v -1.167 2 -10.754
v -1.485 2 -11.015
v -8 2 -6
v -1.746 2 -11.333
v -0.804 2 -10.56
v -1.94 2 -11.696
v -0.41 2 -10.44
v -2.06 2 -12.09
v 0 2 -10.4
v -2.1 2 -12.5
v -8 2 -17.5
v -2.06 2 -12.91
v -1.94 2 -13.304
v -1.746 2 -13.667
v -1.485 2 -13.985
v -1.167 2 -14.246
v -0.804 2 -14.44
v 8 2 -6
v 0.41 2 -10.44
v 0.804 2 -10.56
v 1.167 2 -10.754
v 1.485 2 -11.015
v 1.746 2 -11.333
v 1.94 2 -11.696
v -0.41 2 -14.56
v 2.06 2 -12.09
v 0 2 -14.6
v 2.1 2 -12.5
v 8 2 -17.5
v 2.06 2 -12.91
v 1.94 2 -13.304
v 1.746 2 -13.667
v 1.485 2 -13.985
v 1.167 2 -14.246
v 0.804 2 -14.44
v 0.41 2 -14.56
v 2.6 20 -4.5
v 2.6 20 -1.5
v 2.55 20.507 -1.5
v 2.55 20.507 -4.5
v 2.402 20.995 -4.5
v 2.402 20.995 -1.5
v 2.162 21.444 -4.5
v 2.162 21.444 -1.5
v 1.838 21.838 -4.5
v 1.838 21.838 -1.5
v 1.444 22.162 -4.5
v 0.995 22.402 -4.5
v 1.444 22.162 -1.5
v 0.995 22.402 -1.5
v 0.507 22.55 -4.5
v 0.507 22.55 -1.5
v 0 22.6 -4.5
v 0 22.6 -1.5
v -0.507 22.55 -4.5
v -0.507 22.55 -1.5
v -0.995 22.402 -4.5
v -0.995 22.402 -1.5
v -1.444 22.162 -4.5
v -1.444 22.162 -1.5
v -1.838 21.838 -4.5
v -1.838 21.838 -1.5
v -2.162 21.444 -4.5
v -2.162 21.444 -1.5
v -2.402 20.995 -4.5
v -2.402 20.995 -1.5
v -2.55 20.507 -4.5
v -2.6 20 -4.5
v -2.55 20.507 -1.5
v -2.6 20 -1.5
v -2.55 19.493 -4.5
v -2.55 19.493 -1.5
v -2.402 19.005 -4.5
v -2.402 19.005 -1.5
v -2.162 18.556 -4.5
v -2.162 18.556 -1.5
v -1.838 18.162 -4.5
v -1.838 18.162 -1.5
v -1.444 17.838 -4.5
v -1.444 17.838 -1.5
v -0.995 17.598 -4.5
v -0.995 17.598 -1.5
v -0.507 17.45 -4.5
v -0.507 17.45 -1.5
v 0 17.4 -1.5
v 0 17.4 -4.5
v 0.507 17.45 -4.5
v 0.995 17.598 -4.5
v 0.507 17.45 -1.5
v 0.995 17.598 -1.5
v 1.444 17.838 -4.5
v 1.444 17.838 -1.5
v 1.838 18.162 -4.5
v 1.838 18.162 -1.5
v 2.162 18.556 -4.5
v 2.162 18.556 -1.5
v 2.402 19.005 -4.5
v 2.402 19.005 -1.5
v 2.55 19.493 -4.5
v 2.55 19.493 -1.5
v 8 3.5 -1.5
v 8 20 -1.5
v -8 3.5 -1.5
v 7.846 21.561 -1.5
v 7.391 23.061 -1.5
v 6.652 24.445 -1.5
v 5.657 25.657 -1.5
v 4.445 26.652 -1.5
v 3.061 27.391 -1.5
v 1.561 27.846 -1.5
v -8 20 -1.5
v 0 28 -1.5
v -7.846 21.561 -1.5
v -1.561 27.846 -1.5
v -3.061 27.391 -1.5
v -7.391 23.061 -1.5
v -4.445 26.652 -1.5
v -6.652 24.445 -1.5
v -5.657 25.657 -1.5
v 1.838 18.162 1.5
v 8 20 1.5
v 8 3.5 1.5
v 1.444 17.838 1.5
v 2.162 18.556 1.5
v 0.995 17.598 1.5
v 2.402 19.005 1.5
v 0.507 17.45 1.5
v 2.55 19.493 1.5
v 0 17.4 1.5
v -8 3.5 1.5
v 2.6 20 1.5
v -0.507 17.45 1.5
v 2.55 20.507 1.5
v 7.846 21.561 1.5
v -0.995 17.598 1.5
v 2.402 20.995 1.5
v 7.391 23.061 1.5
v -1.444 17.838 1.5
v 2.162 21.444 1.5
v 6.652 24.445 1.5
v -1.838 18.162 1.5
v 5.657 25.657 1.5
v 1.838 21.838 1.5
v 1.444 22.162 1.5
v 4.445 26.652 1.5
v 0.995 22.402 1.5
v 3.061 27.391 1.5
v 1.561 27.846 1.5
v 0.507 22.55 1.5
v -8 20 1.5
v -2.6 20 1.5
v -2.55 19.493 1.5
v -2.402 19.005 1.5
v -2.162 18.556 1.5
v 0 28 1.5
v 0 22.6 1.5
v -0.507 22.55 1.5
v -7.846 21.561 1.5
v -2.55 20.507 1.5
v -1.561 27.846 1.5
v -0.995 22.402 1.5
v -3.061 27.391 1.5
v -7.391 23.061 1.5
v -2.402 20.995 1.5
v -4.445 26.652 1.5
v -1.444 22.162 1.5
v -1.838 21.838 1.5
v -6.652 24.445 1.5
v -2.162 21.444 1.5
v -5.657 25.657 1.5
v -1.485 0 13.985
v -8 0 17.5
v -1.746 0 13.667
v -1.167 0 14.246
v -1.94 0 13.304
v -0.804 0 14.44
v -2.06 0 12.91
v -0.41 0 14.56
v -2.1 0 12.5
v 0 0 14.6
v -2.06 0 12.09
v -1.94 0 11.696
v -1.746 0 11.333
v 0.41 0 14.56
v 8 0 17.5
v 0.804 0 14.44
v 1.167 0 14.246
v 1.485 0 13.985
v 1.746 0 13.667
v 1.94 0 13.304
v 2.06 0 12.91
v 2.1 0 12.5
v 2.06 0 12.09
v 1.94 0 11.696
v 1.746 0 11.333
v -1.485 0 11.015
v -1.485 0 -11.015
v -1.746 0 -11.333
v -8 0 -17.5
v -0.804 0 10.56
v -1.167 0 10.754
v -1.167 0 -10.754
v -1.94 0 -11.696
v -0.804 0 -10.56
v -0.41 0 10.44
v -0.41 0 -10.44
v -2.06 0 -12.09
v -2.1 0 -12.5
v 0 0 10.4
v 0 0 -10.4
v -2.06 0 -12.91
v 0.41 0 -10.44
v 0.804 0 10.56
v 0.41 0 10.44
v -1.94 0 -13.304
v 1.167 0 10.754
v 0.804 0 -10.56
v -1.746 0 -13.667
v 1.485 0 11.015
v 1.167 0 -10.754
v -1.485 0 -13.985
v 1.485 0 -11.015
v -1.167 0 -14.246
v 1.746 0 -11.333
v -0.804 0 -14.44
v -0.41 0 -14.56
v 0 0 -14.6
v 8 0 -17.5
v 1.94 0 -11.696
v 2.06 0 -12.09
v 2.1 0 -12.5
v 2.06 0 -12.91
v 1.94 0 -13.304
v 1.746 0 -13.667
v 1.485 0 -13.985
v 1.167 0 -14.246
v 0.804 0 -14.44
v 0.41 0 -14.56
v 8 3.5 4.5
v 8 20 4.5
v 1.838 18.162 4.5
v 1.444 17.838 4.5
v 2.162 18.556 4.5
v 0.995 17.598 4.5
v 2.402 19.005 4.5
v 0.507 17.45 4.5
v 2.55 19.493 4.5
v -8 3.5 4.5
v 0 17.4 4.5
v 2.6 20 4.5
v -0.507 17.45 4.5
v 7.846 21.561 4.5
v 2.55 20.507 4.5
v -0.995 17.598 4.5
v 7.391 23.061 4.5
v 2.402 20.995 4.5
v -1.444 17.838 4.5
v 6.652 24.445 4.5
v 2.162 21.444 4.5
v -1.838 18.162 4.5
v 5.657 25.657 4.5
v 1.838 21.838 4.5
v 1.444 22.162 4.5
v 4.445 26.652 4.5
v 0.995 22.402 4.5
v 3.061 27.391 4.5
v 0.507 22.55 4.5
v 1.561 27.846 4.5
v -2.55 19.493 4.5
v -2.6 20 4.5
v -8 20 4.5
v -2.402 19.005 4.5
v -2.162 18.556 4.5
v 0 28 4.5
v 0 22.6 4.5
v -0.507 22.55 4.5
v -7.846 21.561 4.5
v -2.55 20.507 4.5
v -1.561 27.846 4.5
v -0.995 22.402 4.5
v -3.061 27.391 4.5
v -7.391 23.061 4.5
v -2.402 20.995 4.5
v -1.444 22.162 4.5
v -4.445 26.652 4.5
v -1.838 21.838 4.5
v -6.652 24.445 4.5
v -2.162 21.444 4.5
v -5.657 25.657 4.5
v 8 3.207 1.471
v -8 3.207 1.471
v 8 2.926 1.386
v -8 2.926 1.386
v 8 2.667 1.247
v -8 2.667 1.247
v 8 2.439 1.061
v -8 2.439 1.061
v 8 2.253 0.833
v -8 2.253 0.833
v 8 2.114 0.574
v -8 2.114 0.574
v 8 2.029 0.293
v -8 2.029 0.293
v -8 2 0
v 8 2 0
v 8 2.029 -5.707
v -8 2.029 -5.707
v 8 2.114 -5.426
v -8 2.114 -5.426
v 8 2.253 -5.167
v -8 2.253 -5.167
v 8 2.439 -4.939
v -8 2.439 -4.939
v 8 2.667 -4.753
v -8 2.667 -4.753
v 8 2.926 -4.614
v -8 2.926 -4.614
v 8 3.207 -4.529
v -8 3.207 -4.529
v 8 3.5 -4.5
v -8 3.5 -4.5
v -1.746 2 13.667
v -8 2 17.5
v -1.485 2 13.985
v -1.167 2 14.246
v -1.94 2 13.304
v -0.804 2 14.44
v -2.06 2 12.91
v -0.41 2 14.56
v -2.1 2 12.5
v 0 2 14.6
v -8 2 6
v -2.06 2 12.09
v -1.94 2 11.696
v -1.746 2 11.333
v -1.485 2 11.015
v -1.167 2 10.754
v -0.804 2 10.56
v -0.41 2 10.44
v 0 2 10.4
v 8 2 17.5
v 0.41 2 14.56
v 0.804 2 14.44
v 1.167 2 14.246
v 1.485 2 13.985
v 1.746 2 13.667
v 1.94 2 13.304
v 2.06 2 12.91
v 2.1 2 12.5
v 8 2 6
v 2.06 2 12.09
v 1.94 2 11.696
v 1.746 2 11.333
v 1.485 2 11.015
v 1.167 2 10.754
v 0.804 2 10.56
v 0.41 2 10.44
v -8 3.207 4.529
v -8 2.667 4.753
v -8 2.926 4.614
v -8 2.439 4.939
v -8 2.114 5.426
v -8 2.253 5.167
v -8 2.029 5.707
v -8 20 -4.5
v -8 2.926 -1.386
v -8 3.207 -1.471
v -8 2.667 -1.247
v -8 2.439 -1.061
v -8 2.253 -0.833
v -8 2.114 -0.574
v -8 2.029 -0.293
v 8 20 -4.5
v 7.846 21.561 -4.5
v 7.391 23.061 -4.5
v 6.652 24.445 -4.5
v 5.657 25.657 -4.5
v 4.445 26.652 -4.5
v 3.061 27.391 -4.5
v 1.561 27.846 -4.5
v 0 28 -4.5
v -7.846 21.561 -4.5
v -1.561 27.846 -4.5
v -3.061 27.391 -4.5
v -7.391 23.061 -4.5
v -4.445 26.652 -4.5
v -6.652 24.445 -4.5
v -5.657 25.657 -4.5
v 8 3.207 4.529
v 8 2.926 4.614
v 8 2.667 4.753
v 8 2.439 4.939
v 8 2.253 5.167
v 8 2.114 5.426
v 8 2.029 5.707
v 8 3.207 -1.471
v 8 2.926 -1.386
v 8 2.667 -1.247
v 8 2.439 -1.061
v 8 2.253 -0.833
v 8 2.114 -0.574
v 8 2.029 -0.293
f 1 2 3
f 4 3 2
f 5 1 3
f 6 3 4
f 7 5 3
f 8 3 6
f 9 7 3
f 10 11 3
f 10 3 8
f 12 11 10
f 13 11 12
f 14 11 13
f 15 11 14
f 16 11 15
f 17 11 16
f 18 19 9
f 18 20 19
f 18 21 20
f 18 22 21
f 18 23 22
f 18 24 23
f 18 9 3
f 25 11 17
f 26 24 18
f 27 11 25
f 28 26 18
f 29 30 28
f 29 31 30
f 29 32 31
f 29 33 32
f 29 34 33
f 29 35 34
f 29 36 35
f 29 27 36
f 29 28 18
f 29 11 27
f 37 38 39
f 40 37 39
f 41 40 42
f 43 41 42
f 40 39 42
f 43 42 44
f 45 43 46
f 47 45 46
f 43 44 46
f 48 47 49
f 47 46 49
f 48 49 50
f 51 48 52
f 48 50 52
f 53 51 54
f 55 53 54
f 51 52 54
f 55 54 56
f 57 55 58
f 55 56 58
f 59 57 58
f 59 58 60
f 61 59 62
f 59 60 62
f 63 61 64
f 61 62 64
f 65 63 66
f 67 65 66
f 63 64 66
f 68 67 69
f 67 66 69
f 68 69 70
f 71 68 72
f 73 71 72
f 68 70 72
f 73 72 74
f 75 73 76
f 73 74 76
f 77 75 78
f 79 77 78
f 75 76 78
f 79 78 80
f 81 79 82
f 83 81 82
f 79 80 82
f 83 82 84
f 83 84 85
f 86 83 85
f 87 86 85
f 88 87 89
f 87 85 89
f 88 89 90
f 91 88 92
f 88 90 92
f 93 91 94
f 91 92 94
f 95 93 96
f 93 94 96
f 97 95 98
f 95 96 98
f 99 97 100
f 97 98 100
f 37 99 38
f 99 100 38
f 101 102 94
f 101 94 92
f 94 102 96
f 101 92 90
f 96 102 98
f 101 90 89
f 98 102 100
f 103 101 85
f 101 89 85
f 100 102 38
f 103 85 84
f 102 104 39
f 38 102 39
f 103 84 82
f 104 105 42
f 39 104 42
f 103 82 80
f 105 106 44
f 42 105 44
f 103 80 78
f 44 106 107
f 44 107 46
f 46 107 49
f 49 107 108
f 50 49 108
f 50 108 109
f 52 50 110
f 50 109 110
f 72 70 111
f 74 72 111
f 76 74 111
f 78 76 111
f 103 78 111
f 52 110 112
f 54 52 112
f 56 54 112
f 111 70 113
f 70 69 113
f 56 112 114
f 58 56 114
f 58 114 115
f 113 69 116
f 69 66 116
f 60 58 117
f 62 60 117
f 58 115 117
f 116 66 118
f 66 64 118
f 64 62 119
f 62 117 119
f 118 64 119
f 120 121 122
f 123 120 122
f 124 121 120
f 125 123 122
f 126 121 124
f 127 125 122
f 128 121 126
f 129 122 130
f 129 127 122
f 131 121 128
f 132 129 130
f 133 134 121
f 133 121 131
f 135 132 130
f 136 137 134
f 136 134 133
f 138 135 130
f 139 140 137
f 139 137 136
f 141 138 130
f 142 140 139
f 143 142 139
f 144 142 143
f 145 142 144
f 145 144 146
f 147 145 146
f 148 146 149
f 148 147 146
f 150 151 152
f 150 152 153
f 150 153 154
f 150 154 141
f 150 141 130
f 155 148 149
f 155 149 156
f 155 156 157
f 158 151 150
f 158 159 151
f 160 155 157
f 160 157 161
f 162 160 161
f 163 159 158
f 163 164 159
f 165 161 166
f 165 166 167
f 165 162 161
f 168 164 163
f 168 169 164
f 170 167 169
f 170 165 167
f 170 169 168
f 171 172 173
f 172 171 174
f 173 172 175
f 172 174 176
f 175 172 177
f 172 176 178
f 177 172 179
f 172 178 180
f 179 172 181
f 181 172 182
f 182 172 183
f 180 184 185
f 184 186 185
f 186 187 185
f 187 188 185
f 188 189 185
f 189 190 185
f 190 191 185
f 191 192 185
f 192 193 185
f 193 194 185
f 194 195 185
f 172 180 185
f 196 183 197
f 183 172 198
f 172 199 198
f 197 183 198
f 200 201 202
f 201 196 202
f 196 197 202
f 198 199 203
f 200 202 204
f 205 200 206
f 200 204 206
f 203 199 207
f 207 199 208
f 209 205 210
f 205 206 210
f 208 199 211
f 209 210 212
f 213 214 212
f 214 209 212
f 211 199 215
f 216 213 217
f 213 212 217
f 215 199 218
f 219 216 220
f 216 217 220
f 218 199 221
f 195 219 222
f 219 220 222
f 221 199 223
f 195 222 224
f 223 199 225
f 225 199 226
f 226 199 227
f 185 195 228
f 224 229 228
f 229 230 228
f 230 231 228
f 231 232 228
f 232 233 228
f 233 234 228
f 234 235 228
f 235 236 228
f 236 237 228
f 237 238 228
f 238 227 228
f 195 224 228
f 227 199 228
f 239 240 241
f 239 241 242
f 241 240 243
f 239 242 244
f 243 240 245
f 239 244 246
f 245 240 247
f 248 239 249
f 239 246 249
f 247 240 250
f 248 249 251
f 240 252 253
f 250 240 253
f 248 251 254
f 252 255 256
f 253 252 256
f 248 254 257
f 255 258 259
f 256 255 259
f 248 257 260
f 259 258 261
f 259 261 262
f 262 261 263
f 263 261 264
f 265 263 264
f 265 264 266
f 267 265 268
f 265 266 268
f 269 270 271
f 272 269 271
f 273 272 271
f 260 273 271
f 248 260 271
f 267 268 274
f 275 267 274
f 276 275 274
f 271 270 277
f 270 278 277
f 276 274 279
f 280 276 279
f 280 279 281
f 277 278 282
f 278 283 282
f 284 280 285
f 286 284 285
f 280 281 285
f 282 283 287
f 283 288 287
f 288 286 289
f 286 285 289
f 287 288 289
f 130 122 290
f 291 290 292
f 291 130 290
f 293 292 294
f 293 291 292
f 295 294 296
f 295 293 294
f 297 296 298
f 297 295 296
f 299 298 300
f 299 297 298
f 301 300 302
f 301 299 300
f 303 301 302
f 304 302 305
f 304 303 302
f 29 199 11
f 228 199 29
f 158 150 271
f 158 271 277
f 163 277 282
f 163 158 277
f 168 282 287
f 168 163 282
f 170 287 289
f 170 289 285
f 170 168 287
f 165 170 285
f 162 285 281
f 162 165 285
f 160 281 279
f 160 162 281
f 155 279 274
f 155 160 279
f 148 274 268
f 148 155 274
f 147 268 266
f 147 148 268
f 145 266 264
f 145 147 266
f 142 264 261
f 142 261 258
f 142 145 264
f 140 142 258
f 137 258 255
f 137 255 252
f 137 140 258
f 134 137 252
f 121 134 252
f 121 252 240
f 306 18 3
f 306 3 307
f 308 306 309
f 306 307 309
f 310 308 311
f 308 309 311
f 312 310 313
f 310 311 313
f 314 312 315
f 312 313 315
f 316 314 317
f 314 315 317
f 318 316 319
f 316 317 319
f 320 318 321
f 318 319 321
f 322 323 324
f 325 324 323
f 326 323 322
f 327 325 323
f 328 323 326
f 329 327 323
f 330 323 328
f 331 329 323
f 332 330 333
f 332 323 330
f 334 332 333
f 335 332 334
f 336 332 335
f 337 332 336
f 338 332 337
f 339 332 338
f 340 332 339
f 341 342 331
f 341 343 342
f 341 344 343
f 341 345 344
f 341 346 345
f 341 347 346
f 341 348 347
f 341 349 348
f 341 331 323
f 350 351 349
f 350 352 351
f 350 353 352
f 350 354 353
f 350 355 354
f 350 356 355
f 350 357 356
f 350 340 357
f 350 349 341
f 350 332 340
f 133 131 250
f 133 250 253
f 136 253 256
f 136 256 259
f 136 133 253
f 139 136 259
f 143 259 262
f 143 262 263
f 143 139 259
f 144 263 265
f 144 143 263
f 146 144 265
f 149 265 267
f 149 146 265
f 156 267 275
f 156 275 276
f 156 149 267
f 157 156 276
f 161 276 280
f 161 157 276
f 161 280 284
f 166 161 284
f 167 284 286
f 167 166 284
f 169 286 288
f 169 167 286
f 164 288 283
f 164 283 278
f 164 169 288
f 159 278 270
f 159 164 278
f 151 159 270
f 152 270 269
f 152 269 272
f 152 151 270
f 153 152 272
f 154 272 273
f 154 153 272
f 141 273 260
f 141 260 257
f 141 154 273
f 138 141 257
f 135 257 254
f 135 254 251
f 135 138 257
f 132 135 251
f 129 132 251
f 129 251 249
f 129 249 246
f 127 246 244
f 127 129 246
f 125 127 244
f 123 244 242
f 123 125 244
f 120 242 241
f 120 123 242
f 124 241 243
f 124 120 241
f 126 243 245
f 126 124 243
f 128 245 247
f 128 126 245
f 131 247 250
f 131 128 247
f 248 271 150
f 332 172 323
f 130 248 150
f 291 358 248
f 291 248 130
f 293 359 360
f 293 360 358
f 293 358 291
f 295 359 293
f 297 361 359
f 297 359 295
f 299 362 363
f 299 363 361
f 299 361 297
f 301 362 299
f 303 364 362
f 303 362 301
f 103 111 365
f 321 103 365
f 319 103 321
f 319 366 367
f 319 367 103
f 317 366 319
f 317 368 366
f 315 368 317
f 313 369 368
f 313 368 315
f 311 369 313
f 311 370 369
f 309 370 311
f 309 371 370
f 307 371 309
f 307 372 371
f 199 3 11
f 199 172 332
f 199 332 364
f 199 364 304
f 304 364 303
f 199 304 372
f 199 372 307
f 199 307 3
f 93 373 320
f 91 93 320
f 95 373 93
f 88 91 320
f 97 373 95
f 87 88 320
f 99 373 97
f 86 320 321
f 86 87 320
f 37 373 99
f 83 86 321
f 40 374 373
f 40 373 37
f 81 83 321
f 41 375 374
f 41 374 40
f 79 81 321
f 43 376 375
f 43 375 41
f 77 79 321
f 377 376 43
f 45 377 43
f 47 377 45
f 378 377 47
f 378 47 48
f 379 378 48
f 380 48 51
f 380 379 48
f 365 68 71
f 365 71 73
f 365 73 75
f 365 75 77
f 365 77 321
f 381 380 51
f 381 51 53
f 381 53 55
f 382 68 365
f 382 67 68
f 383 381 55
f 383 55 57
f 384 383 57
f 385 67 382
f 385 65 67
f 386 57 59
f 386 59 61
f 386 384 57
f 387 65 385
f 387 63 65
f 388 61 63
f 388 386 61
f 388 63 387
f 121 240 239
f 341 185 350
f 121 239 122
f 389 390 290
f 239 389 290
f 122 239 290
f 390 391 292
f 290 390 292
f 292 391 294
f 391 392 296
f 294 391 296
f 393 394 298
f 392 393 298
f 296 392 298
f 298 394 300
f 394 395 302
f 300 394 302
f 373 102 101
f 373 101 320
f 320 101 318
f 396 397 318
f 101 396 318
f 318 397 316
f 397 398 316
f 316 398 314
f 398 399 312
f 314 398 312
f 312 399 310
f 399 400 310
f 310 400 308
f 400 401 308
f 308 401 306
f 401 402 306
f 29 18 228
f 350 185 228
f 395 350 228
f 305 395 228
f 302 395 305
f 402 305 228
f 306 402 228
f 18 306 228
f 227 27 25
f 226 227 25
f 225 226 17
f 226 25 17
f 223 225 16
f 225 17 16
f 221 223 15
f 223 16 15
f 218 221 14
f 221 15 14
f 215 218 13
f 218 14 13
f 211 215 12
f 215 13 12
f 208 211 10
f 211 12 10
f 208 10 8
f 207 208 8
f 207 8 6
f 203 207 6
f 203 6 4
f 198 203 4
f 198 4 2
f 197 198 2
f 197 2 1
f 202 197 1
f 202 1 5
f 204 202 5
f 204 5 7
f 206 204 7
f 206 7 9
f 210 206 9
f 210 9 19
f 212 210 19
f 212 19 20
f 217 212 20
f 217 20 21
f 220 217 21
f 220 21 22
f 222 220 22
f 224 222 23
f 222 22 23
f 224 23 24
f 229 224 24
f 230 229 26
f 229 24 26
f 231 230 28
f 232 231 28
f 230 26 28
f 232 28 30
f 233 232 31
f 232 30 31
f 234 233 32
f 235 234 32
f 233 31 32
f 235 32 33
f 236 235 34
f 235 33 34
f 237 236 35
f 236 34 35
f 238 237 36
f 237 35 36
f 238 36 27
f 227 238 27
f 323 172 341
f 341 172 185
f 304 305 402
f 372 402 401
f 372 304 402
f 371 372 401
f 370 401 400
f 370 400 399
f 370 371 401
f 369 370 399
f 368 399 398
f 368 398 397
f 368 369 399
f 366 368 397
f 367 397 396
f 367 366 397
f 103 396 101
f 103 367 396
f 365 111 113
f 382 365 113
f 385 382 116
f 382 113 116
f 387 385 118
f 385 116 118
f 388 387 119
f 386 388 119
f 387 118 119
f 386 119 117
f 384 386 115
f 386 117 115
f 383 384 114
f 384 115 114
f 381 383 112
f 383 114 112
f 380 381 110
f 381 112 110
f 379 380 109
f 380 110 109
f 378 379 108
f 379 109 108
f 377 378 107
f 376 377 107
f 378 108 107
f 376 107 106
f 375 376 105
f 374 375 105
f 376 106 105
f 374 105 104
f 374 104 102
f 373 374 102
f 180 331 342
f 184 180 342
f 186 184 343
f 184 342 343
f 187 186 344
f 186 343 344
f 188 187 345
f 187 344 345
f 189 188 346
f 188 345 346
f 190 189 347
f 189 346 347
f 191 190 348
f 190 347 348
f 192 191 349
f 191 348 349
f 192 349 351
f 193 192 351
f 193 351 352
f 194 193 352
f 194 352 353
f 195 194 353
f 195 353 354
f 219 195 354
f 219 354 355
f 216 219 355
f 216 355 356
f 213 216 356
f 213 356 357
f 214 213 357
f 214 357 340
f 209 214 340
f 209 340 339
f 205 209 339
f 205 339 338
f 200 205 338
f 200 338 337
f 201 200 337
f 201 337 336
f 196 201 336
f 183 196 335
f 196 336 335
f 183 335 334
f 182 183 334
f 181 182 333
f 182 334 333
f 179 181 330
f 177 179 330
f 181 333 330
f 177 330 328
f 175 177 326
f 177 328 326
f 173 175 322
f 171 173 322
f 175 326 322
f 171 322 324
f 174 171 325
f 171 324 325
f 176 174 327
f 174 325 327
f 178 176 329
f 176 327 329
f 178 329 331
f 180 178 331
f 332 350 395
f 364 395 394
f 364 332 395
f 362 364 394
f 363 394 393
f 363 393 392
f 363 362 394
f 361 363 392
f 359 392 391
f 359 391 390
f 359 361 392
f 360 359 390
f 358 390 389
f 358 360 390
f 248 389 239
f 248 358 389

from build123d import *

# Parameters (mm, degrees)
SKETCH_2_W          = 16
SKETCH_2_H          = 35
EXTRUDE_1_DEPTH     = 2
EXTRUDE_START       = 1.5
SKETCH_4_R          = 2.6
EXTRUDE_2_DEPTH     = 3
FILLET_2_R          = 1.5
SKETCH_5_R          = 2.1
CUT_EXTRUDE_1_DEPTH = 33.345787979


with BuildPart() as part:
    # 草圖2 → 填料-伸長1 (new body)
    with BuildSketch(Plane(origin=(0, 0, 0), x_dir=(1, 0, 0), z_dir=(0, 1, 0))):
        Rectangle(SKETCH_2_W, SKETCH_2_H)
    extrude(amount=EXTRUDE_1_DEPTH)

    # 草圖4 → 填料-伸長2 (add)
    with BuildSketch(Plane.XY.offset(EXTRUDE_START)):
        with BuildLine():
            Line((8, 20), (8, 2))
            Line((8, 2), (-8, 2))
            Line((-8, 2), (-8, 20))
            ThreePointArc((-8, 20), (0, 28), (8, 20))
        make_face()
        with Locations((0, 20)):
            Circle(SKETCH_4_R, mode=Mode.SUBTRACT)
    extrude_2 = extrude(amount=EXTRUDE_2_DEPTH)

    # 鏡射1: 填料-伸長2 across plane
    add(extrude_2.mirror(Plane.XY))

    # 圓角2
    fillet_2_edges = [part.edges().sort_by_distance(p)[0] for p in [
        (0, 2, 4.5),
        (0, 2, 1.5),
        (0, 2, -4.5),
        (0, 2, -1.5),
    ]]
    fillet(fillet_2_edges, radius=FILLET_2_R - 0.0001)  # a hair under: the kernel refuses the full size

    # 草圖5 → 除料-伸長1 (cut, through all)
    with BuildSketch(Plane(origin=(0, 2, 0), x_dir=(1, 0, 0), z_dir=(0, 1, 0))):
        with Locations(Location((0, -12.5, 0), (0, 0, 270))):
            Circle(SKETCH_5_R)
        with Locations(Location((0, 12.5, 0), (0, 0, 90))):
            Circle(SKETCH_5_R)
    extrude(amount=-CUT_EXTRUDE_1_DEPTH, mode=Mode.SUBTRACT)


solid = part.part
